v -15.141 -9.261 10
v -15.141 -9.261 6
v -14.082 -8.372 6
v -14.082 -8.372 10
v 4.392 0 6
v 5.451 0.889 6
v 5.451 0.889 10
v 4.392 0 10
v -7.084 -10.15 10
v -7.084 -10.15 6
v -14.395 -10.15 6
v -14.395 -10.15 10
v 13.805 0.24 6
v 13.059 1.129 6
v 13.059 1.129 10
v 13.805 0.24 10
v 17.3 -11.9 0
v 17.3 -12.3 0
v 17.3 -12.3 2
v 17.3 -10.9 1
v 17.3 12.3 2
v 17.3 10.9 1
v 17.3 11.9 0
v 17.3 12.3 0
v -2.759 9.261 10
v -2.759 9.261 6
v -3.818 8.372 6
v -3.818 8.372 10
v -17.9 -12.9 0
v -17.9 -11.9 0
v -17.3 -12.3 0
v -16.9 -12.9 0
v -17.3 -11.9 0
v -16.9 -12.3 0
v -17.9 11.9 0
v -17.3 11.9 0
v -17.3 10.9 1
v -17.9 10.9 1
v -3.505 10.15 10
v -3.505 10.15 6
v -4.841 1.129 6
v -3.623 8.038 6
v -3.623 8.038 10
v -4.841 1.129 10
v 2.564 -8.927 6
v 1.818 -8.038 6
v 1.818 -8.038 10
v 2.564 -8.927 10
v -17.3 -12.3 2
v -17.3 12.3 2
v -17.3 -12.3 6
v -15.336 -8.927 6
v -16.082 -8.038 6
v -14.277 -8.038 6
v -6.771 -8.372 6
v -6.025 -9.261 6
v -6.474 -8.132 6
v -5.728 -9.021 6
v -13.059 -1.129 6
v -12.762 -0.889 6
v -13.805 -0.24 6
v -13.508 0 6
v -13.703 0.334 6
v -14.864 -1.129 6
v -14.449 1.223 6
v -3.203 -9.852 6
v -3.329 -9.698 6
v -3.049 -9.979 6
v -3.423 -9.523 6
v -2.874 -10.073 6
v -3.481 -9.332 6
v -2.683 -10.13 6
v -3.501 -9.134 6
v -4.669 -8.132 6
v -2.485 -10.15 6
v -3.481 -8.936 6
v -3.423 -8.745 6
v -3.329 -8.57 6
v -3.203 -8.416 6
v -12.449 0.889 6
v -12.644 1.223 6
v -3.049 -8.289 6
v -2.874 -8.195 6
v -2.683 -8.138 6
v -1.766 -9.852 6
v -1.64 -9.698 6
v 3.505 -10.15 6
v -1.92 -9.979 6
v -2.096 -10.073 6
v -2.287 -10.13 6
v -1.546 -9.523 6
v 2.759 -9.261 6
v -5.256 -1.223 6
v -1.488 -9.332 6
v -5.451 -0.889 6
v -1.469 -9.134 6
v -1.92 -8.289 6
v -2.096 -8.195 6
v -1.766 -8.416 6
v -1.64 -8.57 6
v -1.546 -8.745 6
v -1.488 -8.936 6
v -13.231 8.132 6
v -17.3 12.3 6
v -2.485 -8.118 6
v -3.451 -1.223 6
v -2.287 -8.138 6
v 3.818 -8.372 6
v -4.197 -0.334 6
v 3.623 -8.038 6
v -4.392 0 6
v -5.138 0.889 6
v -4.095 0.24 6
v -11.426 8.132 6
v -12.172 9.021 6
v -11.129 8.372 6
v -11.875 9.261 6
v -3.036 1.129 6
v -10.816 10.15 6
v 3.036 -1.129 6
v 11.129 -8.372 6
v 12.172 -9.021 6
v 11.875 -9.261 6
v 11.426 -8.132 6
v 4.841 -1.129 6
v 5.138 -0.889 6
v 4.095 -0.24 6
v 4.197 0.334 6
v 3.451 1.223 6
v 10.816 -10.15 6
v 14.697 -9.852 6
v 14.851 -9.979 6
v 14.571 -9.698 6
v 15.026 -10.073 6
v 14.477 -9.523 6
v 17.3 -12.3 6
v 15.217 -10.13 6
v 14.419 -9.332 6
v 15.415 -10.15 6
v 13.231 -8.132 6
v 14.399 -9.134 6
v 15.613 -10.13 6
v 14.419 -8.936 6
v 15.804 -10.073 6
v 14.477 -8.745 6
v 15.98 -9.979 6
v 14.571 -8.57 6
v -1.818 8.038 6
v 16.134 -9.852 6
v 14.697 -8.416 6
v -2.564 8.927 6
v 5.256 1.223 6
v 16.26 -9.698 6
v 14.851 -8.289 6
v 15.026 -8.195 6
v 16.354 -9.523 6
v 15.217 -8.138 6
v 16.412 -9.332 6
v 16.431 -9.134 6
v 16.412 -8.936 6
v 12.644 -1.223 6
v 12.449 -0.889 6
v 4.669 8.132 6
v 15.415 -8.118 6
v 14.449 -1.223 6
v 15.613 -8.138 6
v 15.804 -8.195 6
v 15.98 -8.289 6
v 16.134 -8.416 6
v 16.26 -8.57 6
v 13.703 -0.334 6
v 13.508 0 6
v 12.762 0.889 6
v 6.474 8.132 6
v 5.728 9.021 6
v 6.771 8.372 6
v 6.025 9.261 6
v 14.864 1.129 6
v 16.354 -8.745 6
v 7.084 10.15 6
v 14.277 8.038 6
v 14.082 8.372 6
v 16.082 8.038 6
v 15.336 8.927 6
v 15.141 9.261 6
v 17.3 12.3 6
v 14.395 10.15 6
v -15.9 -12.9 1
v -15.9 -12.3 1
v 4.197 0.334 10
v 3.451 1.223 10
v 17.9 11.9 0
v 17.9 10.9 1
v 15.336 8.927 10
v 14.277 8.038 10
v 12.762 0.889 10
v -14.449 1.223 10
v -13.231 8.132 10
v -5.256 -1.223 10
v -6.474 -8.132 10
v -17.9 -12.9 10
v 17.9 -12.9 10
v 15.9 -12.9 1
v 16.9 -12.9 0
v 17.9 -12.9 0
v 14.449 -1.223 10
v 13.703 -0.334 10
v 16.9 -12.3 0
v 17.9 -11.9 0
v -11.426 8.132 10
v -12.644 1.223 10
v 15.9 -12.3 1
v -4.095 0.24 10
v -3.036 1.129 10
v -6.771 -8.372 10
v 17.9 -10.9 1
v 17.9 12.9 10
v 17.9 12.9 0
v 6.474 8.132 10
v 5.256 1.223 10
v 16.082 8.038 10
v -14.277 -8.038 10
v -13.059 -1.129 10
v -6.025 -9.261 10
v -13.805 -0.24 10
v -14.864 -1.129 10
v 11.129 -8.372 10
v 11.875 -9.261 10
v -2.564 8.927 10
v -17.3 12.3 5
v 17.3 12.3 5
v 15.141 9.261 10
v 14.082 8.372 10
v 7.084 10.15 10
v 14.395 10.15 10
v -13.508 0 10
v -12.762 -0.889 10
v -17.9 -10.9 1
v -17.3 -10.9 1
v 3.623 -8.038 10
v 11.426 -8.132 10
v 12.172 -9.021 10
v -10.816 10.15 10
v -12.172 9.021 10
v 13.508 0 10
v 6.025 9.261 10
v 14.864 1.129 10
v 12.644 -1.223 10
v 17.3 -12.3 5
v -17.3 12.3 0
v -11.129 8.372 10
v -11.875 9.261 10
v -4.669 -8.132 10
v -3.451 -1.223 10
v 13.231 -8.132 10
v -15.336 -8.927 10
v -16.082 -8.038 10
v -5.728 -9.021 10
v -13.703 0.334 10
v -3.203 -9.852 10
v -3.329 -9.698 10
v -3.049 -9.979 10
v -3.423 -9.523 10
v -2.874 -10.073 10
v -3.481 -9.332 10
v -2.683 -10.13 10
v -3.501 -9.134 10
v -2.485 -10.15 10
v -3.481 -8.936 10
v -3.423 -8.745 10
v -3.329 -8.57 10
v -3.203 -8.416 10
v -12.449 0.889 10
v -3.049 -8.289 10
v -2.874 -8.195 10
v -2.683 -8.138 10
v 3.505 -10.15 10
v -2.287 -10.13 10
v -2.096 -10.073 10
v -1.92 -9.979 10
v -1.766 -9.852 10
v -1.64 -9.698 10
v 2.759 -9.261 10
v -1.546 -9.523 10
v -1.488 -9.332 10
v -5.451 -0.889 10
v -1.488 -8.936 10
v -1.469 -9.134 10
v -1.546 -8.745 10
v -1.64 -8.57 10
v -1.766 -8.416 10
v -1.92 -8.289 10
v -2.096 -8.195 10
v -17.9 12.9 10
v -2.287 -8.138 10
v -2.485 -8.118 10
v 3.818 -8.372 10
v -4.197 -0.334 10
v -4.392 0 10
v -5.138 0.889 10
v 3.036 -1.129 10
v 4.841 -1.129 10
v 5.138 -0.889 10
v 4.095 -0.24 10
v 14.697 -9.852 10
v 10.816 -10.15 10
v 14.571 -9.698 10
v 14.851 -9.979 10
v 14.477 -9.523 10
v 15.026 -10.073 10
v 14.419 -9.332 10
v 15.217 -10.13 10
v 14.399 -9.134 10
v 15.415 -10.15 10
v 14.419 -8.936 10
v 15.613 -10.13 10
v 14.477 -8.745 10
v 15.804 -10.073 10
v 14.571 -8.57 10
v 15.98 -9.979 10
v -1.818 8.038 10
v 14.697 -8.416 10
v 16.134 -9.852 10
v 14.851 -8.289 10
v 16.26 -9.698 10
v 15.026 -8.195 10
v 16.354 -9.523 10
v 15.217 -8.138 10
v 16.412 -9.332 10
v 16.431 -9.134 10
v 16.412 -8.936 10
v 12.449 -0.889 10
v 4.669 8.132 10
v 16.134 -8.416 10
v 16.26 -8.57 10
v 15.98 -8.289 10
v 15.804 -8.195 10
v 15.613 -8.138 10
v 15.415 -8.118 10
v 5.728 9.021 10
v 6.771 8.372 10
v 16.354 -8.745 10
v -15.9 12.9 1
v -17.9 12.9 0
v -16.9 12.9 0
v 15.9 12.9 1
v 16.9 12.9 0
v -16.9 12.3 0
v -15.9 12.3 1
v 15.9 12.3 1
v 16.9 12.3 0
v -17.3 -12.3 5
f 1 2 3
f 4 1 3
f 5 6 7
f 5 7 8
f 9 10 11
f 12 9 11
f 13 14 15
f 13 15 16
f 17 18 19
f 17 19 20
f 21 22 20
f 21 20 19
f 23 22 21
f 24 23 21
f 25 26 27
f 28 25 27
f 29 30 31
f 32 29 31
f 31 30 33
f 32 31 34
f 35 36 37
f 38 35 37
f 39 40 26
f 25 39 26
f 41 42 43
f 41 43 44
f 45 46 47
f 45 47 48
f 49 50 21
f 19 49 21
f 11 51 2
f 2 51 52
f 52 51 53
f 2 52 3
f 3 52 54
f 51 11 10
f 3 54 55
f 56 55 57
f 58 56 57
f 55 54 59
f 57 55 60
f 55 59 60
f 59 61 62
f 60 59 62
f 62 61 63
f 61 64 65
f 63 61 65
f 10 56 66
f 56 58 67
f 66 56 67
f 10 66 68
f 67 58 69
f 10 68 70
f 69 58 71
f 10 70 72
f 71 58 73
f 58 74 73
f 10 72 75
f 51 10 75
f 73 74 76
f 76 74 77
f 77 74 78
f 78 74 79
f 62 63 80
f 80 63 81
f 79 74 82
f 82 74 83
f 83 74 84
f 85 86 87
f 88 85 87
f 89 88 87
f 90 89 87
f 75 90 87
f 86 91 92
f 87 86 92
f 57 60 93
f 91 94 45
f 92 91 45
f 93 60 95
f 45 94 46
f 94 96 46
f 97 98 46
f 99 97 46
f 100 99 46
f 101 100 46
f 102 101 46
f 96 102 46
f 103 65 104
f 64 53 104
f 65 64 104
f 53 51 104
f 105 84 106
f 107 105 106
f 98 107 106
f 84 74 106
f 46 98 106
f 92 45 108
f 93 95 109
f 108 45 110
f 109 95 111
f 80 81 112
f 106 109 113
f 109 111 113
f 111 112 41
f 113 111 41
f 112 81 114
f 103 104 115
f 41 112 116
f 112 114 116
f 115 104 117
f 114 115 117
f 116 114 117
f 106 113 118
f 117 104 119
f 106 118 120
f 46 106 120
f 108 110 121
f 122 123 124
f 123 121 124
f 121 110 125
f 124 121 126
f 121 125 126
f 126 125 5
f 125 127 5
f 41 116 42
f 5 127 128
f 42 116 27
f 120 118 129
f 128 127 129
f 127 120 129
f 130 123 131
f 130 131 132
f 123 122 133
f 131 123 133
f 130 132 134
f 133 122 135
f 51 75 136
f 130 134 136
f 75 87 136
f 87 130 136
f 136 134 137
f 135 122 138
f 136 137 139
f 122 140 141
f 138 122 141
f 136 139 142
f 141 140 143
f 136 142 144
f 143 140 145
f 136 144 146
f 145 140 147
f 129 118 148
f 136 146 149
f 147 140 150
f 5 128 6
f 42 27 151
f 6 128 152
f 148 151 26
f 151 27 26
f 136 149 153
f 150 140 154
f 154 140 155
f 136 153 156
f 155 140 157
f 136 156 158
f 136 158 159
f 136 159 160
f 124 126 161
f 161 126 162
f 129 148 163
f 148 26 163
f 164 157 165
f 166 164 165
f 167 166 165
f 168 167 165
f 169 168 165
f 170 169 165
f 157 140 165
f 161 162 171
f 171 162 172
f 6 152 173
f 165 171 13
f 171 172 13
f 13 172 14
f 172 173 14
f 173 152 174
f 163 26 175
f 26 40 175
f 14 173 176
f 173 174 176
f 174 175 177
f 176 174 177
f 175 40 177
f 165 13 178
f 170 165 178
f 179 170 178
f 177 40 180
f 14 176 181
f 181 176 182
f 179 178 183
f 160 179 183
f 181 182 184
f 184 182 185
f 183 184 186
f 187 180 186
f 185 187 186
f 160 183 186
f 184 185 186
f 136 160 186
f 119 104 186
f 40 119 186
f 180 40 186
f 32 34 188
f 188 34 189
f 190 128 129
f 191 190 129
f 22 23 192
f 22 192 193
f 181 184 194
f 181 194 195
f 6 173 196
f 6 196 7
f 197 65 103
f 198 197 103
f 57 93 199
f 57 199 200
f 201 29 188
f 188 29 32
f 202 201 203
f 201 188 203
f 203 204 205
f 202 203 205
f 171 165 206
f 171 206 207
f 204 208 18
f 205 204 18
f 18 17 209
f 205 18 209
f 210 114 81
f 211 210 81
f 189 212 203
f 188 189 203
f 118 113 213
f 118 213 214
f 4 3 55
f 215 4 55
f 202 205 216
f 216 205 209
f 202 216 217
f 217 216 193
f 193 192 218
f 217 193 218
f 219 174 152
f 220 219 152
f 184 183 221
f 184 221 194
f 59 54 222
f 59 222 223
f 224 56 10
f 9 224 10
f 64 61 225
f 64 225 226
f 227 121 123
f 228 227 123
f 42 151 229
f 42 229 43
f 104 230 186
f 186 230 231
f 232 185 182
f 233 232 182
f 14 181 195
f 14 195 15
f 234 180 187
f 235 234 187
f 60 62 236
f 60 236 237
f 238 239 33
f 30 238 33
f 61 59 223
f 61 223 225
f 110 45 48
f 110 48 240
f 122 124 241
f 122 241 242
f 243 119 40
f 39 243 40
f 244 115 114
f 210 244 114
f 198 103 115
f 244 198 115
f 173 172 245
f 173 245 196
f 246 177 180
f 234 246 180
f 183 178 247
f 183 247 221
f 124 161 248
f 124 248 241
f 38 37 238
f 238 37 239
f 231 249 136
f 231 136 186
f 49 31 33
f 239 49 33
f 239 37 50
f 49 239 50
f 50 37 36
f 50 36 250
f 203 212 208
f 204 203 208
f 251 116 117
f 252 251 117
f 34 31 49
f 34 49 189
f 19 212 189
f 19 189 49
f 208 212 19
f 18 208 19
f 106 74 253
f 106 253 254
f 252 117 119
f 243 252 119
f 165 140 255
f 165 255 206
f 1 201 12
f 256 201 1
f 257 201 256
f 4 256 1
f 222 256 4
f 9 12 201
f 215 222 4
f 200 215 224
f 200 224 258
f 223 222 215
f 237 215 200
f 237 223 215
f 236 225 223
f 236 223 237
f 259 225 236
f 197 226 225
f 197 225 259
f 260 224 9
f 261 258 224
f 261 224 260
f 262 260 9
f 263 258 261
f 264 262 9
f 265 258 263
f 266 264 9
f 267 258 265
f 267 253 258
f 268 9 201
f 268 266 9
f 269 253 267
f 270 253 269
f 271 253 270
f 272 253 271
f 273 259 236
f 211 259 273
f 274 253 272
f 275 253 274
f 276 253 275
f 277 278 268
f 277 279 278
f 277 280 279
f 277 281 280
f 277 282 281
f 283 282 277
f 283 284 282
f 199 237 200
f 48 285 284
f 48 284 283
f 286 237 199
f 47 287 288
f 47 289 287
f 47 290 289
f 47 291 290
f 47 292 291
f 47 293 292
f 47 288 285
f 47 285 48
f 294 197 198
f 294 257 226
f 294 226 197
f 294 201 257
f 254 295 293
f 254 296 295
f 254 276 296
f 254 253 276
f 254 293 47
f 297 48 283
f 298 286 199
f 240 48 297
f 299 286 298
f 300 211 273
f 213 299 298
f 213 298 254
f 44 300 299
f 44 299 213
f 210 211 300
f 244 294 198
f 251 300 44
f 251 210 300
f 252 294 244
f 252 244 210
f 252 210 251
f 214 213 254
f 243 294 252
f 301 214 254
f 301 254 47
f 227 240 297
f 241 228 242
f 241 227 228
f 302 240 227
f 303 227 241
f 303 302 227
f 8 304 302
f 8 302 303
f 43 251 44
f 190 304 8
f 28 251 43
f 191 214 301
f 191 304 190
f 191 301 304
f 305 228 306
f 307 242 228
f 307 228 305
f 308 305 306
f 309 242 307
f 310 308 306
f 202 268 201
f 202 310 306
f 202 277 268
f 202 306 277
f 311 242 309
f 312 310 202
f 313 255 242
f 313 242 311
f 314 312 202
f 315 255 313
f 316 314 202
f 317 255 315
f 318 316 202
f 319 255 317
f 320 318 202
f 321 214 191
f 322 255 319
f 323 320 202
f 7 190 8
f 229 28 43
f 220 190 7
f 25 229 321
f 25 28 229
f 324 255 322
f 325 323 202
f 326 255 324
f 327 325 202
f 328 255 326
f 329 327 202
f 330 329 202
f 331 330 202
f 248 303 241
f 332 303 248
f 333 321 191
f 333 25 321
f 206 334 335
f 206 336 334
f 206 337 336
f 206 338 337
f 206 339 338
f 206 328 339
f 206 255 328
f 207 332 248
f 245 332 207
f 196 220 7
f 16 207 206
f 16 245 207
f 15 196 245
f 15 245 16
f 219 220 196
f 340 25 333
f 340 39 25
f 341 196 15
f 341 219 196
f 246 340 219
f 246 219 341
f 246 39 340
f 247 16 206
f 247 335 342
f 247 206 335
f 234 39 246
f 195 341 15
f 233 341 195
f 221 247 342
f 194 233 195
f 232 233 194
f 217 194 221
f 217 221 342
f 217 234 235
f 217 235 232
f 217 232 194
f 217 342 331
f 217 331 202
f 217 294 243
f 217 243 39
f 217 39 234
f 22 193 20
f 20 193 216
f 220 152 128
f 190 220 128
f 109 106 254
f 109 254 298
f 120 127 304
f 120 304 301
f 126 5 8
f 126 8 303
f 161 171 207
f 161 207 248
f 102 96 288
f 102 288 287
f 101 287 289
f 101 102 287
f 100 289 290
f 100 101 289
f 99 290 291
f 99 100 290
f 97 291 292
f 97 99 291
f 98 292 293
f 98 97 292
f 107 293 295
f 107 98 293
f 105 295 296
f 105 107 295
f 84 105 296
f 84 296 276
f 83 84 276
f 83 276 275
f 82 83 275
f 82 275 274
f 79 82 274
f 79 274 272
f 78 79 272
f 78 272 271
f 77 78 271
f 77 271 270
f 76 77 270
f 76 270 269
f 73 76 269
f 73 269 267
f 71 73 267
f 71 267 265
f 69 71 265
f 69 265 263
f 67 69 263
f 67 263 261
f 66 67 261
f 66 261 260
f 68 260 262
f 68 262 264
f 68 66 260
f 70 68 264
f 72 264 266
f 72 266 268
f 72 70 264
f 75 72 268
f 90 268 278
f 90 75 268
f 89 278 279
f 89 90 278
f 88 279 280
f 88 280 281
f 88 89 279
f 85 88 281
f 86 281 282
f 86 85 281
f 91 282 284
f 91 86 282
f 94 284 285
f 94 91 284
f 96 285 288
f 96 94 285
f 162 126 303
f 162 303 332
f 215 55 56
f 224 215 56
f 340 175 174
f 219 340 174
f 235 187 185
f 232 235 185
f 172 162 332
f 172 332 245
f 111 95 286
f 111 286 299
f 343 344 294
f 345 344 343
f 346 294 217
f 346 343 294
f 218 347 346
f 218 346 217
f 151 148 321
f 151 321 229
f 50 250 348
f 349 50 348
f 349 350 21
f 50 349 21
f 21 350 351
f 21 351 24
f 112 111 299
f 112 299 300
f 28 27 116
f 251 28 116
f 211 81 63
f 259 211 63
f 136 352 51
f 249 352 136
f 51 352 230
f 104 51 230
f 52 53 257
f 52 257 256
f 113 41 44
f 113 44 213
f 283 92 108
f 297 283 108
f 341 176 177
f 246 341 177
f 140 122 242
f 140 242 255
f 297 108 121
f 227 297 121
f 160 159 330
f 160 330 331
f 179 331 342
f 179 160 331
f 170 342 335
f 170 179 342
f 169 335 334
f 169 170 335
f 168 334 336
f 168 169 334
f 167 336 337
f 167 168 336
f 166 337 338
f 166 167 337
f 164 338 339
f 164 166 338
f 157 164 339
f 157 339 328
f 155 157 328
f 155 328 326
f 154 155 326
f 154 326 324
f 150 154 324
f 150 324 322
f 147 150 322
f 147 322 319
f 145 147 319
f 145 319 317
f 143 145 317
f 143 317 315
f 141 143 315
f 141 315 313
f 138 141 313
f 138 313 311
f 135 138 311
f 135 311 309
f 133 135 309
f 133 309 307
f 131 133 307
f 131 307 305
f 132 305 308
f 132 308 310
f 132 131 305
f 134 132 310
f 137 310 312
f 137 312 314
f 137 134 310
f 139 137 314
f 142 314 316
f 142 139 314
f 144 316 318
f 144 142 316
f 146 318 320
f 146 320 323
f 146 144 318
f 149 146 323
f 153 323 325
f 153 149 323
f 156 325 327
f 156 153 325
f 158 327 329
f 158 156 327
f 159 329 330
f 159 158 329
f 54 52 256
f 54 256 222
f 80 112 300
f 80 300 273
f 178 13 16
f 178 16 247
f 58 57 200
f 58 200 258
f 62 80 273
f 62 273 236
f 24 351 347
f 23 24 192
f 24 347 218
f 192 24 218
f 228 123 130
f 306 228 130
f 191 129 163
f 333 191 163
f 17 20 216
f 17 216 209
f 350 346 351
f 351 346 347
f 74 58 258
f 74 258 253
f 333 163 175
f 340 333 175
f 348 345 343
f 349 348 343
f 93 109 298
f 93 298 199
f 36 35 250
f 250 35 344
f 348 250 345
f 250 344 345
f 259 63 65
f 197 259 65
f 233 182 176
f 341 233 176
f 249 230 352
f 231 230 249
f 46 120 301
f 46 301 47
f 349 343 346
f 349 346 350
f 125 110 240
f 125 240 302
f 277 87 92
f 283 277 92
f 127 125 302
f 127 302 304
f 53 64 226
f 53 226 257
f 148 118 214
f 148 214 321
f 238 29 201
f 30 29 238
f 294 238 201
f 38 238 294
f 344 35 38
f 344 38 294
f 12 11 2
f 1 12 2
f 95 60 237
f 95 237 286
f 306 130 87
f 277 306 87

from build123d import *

# Parameters (mm, degrees)
SKETCH_W             = 34.6
SKETCH_H             = 24.6
PAD001_DEPTH         = 1
SKETCH002_R          = 1.016
PAD002_DEPTH         = 5
LINEARPATTERN_COUNT  = 2
LINEARPATTERN_PITCH  = 17.9
SKETCH003_W          = 35.8
SKETCH003_H          = 25.8
PAD003_DEPTH         = 10
POCKET_DEPTH         = 12.901
POCKET_DEPTH_BACK    = 12.901
POCKET001_DEPTH      = 17.901
POCKET001_DEPTH_BACK = 17.901
SKETCH006_W          = 34.6
SKETCH006_H          = 24.6
POCKET002_DEPTH      = 2


with BuildPart() as digit001:
    # Sketch → Pad001 (new body)
    with BuildSketch(Plane.XY):
        Rectangle(SKETCH_W, SKETCH_H)
    extrude(amount=PAD001_DEPTH)

    # Sketch002 → Pad002 (join)
    with BuildSketch(Plane.XY):
        with Locations((-2.484719, -9.134)):
            Circle(SKETCH002_R)
        Polygon((-11.875322, 9.261), (-10.815853, 10.15), (-3.50471, 10.15), (-2.75875, 9.261), (-3.818219, 8.372), (-11.129362, 8.372), align=None)
        Polygon((-12.171581, 9.021337), (-11.425621, 8.132337), (-12.643997, 1.222585), (-13.703466, 0.333585), (-14.449425, 1.222585), (-13.23105, 8.132337), align=None)
        Polygon((-2.56357, 8.927415), (-3.623039, 8.038415), (-4.841415, 1.128663), (-4.095455, 0.239663), (-3.035986, 1.128663), (-1.81761, 8.038415), align=None)
        Polygon((-12.448817, 0.889), (-13.508286, 0), (-12.762326, -0.889), (-5.451183, -0.889), (-4.391714, 0), (-5.137674, 0.889), align=None)
        Polygon((-13.804545, -0.239663), (-14.864014, -1.128663), (-16.08239, -8.038415), (-15.33643, -8.927415), (-14.276961, -8.038415), (-13.058585, -1.128663), align=None)
        Polygon((-4.196534, -0.333585), (-5.256003, -1.222585), (-6.474379, -8.132337), (-5.728419, -9.021337), (-4.66895, -8.132337), (-3.450575, -1.222585), align=None)
        Polygon((-15.14125, -9.261), (-14.081781, -8.372), (-6.770638, -8.372), (-6.024678, -9.261), (-7.084147, -10.15), (-14.39529, -10.15), align=None)
    pad002 = extrude(amount=PAD002_DEPTH)

    # LinearPattern: Pad002 ×2
    with Locations(*[(i * LINEARPATTERN_PITCH, 0, 0) for i in range(1, LINEARPATTERN_COUNT)]):
        add(pad002)


with BuildPart() as digit001_1:
    # Body001 placement: moved
    add(digit001.part.moved(Location((0, 0, 5))))


with BuildPart() as pkg:
    # Sketch003 → Pad003 (new body)
    with BuildSketch(Plane.XY):
        Rectangle(SKETCH003_W, SKETCH003_H)
    extrude(amount=PAD003_DEPTH)

    # Sketch004 → Pocket (cut, two sides)
    with BuildSketch(Plane.XZ) as pocket_sk:
        Polygon((-16.9, 0), (-15.9, 1), (15.9, 1), (16.9, 0), align=None)
    extrude(amount=-POCKET_DEPTH, mode=Mode.SUBTRACT)
    extrude(pocket_sk.sketch, amount=POCKET_DEPTH_BACK, mode=Mode.SUBTRACT)

    # Sketch005 → Pocket001 (cut, two sides)
    with BuildSketch(Plane.YZ) as pocket001_sk:
        Polygon((-11.9, 0), (11.9, 0), (10.9, 1), (-10.9, 1), align=None)
    extrude(amount=-POCKET001_DEPTH, mode=Mode.SUBTRACT)
    extrude(pocket001_sk.sketch, amount=POCKET001_DEPTH_BACK, mode=Mode.SUBTRACT)

    # Sketch006 → Pocket002 (cut)
    with BuildSketch(Plane.XY):
        Rectangle(SKETCH006_W, SKETCH006_H)
    extrude(amount=POCKET002_DEPTH, mode=Mode.SUBTRACT)

    # Cut: cut Digit001
    add(digit001_1.part, mode=Mode.SUBTRACT)


solid = pkg.part
